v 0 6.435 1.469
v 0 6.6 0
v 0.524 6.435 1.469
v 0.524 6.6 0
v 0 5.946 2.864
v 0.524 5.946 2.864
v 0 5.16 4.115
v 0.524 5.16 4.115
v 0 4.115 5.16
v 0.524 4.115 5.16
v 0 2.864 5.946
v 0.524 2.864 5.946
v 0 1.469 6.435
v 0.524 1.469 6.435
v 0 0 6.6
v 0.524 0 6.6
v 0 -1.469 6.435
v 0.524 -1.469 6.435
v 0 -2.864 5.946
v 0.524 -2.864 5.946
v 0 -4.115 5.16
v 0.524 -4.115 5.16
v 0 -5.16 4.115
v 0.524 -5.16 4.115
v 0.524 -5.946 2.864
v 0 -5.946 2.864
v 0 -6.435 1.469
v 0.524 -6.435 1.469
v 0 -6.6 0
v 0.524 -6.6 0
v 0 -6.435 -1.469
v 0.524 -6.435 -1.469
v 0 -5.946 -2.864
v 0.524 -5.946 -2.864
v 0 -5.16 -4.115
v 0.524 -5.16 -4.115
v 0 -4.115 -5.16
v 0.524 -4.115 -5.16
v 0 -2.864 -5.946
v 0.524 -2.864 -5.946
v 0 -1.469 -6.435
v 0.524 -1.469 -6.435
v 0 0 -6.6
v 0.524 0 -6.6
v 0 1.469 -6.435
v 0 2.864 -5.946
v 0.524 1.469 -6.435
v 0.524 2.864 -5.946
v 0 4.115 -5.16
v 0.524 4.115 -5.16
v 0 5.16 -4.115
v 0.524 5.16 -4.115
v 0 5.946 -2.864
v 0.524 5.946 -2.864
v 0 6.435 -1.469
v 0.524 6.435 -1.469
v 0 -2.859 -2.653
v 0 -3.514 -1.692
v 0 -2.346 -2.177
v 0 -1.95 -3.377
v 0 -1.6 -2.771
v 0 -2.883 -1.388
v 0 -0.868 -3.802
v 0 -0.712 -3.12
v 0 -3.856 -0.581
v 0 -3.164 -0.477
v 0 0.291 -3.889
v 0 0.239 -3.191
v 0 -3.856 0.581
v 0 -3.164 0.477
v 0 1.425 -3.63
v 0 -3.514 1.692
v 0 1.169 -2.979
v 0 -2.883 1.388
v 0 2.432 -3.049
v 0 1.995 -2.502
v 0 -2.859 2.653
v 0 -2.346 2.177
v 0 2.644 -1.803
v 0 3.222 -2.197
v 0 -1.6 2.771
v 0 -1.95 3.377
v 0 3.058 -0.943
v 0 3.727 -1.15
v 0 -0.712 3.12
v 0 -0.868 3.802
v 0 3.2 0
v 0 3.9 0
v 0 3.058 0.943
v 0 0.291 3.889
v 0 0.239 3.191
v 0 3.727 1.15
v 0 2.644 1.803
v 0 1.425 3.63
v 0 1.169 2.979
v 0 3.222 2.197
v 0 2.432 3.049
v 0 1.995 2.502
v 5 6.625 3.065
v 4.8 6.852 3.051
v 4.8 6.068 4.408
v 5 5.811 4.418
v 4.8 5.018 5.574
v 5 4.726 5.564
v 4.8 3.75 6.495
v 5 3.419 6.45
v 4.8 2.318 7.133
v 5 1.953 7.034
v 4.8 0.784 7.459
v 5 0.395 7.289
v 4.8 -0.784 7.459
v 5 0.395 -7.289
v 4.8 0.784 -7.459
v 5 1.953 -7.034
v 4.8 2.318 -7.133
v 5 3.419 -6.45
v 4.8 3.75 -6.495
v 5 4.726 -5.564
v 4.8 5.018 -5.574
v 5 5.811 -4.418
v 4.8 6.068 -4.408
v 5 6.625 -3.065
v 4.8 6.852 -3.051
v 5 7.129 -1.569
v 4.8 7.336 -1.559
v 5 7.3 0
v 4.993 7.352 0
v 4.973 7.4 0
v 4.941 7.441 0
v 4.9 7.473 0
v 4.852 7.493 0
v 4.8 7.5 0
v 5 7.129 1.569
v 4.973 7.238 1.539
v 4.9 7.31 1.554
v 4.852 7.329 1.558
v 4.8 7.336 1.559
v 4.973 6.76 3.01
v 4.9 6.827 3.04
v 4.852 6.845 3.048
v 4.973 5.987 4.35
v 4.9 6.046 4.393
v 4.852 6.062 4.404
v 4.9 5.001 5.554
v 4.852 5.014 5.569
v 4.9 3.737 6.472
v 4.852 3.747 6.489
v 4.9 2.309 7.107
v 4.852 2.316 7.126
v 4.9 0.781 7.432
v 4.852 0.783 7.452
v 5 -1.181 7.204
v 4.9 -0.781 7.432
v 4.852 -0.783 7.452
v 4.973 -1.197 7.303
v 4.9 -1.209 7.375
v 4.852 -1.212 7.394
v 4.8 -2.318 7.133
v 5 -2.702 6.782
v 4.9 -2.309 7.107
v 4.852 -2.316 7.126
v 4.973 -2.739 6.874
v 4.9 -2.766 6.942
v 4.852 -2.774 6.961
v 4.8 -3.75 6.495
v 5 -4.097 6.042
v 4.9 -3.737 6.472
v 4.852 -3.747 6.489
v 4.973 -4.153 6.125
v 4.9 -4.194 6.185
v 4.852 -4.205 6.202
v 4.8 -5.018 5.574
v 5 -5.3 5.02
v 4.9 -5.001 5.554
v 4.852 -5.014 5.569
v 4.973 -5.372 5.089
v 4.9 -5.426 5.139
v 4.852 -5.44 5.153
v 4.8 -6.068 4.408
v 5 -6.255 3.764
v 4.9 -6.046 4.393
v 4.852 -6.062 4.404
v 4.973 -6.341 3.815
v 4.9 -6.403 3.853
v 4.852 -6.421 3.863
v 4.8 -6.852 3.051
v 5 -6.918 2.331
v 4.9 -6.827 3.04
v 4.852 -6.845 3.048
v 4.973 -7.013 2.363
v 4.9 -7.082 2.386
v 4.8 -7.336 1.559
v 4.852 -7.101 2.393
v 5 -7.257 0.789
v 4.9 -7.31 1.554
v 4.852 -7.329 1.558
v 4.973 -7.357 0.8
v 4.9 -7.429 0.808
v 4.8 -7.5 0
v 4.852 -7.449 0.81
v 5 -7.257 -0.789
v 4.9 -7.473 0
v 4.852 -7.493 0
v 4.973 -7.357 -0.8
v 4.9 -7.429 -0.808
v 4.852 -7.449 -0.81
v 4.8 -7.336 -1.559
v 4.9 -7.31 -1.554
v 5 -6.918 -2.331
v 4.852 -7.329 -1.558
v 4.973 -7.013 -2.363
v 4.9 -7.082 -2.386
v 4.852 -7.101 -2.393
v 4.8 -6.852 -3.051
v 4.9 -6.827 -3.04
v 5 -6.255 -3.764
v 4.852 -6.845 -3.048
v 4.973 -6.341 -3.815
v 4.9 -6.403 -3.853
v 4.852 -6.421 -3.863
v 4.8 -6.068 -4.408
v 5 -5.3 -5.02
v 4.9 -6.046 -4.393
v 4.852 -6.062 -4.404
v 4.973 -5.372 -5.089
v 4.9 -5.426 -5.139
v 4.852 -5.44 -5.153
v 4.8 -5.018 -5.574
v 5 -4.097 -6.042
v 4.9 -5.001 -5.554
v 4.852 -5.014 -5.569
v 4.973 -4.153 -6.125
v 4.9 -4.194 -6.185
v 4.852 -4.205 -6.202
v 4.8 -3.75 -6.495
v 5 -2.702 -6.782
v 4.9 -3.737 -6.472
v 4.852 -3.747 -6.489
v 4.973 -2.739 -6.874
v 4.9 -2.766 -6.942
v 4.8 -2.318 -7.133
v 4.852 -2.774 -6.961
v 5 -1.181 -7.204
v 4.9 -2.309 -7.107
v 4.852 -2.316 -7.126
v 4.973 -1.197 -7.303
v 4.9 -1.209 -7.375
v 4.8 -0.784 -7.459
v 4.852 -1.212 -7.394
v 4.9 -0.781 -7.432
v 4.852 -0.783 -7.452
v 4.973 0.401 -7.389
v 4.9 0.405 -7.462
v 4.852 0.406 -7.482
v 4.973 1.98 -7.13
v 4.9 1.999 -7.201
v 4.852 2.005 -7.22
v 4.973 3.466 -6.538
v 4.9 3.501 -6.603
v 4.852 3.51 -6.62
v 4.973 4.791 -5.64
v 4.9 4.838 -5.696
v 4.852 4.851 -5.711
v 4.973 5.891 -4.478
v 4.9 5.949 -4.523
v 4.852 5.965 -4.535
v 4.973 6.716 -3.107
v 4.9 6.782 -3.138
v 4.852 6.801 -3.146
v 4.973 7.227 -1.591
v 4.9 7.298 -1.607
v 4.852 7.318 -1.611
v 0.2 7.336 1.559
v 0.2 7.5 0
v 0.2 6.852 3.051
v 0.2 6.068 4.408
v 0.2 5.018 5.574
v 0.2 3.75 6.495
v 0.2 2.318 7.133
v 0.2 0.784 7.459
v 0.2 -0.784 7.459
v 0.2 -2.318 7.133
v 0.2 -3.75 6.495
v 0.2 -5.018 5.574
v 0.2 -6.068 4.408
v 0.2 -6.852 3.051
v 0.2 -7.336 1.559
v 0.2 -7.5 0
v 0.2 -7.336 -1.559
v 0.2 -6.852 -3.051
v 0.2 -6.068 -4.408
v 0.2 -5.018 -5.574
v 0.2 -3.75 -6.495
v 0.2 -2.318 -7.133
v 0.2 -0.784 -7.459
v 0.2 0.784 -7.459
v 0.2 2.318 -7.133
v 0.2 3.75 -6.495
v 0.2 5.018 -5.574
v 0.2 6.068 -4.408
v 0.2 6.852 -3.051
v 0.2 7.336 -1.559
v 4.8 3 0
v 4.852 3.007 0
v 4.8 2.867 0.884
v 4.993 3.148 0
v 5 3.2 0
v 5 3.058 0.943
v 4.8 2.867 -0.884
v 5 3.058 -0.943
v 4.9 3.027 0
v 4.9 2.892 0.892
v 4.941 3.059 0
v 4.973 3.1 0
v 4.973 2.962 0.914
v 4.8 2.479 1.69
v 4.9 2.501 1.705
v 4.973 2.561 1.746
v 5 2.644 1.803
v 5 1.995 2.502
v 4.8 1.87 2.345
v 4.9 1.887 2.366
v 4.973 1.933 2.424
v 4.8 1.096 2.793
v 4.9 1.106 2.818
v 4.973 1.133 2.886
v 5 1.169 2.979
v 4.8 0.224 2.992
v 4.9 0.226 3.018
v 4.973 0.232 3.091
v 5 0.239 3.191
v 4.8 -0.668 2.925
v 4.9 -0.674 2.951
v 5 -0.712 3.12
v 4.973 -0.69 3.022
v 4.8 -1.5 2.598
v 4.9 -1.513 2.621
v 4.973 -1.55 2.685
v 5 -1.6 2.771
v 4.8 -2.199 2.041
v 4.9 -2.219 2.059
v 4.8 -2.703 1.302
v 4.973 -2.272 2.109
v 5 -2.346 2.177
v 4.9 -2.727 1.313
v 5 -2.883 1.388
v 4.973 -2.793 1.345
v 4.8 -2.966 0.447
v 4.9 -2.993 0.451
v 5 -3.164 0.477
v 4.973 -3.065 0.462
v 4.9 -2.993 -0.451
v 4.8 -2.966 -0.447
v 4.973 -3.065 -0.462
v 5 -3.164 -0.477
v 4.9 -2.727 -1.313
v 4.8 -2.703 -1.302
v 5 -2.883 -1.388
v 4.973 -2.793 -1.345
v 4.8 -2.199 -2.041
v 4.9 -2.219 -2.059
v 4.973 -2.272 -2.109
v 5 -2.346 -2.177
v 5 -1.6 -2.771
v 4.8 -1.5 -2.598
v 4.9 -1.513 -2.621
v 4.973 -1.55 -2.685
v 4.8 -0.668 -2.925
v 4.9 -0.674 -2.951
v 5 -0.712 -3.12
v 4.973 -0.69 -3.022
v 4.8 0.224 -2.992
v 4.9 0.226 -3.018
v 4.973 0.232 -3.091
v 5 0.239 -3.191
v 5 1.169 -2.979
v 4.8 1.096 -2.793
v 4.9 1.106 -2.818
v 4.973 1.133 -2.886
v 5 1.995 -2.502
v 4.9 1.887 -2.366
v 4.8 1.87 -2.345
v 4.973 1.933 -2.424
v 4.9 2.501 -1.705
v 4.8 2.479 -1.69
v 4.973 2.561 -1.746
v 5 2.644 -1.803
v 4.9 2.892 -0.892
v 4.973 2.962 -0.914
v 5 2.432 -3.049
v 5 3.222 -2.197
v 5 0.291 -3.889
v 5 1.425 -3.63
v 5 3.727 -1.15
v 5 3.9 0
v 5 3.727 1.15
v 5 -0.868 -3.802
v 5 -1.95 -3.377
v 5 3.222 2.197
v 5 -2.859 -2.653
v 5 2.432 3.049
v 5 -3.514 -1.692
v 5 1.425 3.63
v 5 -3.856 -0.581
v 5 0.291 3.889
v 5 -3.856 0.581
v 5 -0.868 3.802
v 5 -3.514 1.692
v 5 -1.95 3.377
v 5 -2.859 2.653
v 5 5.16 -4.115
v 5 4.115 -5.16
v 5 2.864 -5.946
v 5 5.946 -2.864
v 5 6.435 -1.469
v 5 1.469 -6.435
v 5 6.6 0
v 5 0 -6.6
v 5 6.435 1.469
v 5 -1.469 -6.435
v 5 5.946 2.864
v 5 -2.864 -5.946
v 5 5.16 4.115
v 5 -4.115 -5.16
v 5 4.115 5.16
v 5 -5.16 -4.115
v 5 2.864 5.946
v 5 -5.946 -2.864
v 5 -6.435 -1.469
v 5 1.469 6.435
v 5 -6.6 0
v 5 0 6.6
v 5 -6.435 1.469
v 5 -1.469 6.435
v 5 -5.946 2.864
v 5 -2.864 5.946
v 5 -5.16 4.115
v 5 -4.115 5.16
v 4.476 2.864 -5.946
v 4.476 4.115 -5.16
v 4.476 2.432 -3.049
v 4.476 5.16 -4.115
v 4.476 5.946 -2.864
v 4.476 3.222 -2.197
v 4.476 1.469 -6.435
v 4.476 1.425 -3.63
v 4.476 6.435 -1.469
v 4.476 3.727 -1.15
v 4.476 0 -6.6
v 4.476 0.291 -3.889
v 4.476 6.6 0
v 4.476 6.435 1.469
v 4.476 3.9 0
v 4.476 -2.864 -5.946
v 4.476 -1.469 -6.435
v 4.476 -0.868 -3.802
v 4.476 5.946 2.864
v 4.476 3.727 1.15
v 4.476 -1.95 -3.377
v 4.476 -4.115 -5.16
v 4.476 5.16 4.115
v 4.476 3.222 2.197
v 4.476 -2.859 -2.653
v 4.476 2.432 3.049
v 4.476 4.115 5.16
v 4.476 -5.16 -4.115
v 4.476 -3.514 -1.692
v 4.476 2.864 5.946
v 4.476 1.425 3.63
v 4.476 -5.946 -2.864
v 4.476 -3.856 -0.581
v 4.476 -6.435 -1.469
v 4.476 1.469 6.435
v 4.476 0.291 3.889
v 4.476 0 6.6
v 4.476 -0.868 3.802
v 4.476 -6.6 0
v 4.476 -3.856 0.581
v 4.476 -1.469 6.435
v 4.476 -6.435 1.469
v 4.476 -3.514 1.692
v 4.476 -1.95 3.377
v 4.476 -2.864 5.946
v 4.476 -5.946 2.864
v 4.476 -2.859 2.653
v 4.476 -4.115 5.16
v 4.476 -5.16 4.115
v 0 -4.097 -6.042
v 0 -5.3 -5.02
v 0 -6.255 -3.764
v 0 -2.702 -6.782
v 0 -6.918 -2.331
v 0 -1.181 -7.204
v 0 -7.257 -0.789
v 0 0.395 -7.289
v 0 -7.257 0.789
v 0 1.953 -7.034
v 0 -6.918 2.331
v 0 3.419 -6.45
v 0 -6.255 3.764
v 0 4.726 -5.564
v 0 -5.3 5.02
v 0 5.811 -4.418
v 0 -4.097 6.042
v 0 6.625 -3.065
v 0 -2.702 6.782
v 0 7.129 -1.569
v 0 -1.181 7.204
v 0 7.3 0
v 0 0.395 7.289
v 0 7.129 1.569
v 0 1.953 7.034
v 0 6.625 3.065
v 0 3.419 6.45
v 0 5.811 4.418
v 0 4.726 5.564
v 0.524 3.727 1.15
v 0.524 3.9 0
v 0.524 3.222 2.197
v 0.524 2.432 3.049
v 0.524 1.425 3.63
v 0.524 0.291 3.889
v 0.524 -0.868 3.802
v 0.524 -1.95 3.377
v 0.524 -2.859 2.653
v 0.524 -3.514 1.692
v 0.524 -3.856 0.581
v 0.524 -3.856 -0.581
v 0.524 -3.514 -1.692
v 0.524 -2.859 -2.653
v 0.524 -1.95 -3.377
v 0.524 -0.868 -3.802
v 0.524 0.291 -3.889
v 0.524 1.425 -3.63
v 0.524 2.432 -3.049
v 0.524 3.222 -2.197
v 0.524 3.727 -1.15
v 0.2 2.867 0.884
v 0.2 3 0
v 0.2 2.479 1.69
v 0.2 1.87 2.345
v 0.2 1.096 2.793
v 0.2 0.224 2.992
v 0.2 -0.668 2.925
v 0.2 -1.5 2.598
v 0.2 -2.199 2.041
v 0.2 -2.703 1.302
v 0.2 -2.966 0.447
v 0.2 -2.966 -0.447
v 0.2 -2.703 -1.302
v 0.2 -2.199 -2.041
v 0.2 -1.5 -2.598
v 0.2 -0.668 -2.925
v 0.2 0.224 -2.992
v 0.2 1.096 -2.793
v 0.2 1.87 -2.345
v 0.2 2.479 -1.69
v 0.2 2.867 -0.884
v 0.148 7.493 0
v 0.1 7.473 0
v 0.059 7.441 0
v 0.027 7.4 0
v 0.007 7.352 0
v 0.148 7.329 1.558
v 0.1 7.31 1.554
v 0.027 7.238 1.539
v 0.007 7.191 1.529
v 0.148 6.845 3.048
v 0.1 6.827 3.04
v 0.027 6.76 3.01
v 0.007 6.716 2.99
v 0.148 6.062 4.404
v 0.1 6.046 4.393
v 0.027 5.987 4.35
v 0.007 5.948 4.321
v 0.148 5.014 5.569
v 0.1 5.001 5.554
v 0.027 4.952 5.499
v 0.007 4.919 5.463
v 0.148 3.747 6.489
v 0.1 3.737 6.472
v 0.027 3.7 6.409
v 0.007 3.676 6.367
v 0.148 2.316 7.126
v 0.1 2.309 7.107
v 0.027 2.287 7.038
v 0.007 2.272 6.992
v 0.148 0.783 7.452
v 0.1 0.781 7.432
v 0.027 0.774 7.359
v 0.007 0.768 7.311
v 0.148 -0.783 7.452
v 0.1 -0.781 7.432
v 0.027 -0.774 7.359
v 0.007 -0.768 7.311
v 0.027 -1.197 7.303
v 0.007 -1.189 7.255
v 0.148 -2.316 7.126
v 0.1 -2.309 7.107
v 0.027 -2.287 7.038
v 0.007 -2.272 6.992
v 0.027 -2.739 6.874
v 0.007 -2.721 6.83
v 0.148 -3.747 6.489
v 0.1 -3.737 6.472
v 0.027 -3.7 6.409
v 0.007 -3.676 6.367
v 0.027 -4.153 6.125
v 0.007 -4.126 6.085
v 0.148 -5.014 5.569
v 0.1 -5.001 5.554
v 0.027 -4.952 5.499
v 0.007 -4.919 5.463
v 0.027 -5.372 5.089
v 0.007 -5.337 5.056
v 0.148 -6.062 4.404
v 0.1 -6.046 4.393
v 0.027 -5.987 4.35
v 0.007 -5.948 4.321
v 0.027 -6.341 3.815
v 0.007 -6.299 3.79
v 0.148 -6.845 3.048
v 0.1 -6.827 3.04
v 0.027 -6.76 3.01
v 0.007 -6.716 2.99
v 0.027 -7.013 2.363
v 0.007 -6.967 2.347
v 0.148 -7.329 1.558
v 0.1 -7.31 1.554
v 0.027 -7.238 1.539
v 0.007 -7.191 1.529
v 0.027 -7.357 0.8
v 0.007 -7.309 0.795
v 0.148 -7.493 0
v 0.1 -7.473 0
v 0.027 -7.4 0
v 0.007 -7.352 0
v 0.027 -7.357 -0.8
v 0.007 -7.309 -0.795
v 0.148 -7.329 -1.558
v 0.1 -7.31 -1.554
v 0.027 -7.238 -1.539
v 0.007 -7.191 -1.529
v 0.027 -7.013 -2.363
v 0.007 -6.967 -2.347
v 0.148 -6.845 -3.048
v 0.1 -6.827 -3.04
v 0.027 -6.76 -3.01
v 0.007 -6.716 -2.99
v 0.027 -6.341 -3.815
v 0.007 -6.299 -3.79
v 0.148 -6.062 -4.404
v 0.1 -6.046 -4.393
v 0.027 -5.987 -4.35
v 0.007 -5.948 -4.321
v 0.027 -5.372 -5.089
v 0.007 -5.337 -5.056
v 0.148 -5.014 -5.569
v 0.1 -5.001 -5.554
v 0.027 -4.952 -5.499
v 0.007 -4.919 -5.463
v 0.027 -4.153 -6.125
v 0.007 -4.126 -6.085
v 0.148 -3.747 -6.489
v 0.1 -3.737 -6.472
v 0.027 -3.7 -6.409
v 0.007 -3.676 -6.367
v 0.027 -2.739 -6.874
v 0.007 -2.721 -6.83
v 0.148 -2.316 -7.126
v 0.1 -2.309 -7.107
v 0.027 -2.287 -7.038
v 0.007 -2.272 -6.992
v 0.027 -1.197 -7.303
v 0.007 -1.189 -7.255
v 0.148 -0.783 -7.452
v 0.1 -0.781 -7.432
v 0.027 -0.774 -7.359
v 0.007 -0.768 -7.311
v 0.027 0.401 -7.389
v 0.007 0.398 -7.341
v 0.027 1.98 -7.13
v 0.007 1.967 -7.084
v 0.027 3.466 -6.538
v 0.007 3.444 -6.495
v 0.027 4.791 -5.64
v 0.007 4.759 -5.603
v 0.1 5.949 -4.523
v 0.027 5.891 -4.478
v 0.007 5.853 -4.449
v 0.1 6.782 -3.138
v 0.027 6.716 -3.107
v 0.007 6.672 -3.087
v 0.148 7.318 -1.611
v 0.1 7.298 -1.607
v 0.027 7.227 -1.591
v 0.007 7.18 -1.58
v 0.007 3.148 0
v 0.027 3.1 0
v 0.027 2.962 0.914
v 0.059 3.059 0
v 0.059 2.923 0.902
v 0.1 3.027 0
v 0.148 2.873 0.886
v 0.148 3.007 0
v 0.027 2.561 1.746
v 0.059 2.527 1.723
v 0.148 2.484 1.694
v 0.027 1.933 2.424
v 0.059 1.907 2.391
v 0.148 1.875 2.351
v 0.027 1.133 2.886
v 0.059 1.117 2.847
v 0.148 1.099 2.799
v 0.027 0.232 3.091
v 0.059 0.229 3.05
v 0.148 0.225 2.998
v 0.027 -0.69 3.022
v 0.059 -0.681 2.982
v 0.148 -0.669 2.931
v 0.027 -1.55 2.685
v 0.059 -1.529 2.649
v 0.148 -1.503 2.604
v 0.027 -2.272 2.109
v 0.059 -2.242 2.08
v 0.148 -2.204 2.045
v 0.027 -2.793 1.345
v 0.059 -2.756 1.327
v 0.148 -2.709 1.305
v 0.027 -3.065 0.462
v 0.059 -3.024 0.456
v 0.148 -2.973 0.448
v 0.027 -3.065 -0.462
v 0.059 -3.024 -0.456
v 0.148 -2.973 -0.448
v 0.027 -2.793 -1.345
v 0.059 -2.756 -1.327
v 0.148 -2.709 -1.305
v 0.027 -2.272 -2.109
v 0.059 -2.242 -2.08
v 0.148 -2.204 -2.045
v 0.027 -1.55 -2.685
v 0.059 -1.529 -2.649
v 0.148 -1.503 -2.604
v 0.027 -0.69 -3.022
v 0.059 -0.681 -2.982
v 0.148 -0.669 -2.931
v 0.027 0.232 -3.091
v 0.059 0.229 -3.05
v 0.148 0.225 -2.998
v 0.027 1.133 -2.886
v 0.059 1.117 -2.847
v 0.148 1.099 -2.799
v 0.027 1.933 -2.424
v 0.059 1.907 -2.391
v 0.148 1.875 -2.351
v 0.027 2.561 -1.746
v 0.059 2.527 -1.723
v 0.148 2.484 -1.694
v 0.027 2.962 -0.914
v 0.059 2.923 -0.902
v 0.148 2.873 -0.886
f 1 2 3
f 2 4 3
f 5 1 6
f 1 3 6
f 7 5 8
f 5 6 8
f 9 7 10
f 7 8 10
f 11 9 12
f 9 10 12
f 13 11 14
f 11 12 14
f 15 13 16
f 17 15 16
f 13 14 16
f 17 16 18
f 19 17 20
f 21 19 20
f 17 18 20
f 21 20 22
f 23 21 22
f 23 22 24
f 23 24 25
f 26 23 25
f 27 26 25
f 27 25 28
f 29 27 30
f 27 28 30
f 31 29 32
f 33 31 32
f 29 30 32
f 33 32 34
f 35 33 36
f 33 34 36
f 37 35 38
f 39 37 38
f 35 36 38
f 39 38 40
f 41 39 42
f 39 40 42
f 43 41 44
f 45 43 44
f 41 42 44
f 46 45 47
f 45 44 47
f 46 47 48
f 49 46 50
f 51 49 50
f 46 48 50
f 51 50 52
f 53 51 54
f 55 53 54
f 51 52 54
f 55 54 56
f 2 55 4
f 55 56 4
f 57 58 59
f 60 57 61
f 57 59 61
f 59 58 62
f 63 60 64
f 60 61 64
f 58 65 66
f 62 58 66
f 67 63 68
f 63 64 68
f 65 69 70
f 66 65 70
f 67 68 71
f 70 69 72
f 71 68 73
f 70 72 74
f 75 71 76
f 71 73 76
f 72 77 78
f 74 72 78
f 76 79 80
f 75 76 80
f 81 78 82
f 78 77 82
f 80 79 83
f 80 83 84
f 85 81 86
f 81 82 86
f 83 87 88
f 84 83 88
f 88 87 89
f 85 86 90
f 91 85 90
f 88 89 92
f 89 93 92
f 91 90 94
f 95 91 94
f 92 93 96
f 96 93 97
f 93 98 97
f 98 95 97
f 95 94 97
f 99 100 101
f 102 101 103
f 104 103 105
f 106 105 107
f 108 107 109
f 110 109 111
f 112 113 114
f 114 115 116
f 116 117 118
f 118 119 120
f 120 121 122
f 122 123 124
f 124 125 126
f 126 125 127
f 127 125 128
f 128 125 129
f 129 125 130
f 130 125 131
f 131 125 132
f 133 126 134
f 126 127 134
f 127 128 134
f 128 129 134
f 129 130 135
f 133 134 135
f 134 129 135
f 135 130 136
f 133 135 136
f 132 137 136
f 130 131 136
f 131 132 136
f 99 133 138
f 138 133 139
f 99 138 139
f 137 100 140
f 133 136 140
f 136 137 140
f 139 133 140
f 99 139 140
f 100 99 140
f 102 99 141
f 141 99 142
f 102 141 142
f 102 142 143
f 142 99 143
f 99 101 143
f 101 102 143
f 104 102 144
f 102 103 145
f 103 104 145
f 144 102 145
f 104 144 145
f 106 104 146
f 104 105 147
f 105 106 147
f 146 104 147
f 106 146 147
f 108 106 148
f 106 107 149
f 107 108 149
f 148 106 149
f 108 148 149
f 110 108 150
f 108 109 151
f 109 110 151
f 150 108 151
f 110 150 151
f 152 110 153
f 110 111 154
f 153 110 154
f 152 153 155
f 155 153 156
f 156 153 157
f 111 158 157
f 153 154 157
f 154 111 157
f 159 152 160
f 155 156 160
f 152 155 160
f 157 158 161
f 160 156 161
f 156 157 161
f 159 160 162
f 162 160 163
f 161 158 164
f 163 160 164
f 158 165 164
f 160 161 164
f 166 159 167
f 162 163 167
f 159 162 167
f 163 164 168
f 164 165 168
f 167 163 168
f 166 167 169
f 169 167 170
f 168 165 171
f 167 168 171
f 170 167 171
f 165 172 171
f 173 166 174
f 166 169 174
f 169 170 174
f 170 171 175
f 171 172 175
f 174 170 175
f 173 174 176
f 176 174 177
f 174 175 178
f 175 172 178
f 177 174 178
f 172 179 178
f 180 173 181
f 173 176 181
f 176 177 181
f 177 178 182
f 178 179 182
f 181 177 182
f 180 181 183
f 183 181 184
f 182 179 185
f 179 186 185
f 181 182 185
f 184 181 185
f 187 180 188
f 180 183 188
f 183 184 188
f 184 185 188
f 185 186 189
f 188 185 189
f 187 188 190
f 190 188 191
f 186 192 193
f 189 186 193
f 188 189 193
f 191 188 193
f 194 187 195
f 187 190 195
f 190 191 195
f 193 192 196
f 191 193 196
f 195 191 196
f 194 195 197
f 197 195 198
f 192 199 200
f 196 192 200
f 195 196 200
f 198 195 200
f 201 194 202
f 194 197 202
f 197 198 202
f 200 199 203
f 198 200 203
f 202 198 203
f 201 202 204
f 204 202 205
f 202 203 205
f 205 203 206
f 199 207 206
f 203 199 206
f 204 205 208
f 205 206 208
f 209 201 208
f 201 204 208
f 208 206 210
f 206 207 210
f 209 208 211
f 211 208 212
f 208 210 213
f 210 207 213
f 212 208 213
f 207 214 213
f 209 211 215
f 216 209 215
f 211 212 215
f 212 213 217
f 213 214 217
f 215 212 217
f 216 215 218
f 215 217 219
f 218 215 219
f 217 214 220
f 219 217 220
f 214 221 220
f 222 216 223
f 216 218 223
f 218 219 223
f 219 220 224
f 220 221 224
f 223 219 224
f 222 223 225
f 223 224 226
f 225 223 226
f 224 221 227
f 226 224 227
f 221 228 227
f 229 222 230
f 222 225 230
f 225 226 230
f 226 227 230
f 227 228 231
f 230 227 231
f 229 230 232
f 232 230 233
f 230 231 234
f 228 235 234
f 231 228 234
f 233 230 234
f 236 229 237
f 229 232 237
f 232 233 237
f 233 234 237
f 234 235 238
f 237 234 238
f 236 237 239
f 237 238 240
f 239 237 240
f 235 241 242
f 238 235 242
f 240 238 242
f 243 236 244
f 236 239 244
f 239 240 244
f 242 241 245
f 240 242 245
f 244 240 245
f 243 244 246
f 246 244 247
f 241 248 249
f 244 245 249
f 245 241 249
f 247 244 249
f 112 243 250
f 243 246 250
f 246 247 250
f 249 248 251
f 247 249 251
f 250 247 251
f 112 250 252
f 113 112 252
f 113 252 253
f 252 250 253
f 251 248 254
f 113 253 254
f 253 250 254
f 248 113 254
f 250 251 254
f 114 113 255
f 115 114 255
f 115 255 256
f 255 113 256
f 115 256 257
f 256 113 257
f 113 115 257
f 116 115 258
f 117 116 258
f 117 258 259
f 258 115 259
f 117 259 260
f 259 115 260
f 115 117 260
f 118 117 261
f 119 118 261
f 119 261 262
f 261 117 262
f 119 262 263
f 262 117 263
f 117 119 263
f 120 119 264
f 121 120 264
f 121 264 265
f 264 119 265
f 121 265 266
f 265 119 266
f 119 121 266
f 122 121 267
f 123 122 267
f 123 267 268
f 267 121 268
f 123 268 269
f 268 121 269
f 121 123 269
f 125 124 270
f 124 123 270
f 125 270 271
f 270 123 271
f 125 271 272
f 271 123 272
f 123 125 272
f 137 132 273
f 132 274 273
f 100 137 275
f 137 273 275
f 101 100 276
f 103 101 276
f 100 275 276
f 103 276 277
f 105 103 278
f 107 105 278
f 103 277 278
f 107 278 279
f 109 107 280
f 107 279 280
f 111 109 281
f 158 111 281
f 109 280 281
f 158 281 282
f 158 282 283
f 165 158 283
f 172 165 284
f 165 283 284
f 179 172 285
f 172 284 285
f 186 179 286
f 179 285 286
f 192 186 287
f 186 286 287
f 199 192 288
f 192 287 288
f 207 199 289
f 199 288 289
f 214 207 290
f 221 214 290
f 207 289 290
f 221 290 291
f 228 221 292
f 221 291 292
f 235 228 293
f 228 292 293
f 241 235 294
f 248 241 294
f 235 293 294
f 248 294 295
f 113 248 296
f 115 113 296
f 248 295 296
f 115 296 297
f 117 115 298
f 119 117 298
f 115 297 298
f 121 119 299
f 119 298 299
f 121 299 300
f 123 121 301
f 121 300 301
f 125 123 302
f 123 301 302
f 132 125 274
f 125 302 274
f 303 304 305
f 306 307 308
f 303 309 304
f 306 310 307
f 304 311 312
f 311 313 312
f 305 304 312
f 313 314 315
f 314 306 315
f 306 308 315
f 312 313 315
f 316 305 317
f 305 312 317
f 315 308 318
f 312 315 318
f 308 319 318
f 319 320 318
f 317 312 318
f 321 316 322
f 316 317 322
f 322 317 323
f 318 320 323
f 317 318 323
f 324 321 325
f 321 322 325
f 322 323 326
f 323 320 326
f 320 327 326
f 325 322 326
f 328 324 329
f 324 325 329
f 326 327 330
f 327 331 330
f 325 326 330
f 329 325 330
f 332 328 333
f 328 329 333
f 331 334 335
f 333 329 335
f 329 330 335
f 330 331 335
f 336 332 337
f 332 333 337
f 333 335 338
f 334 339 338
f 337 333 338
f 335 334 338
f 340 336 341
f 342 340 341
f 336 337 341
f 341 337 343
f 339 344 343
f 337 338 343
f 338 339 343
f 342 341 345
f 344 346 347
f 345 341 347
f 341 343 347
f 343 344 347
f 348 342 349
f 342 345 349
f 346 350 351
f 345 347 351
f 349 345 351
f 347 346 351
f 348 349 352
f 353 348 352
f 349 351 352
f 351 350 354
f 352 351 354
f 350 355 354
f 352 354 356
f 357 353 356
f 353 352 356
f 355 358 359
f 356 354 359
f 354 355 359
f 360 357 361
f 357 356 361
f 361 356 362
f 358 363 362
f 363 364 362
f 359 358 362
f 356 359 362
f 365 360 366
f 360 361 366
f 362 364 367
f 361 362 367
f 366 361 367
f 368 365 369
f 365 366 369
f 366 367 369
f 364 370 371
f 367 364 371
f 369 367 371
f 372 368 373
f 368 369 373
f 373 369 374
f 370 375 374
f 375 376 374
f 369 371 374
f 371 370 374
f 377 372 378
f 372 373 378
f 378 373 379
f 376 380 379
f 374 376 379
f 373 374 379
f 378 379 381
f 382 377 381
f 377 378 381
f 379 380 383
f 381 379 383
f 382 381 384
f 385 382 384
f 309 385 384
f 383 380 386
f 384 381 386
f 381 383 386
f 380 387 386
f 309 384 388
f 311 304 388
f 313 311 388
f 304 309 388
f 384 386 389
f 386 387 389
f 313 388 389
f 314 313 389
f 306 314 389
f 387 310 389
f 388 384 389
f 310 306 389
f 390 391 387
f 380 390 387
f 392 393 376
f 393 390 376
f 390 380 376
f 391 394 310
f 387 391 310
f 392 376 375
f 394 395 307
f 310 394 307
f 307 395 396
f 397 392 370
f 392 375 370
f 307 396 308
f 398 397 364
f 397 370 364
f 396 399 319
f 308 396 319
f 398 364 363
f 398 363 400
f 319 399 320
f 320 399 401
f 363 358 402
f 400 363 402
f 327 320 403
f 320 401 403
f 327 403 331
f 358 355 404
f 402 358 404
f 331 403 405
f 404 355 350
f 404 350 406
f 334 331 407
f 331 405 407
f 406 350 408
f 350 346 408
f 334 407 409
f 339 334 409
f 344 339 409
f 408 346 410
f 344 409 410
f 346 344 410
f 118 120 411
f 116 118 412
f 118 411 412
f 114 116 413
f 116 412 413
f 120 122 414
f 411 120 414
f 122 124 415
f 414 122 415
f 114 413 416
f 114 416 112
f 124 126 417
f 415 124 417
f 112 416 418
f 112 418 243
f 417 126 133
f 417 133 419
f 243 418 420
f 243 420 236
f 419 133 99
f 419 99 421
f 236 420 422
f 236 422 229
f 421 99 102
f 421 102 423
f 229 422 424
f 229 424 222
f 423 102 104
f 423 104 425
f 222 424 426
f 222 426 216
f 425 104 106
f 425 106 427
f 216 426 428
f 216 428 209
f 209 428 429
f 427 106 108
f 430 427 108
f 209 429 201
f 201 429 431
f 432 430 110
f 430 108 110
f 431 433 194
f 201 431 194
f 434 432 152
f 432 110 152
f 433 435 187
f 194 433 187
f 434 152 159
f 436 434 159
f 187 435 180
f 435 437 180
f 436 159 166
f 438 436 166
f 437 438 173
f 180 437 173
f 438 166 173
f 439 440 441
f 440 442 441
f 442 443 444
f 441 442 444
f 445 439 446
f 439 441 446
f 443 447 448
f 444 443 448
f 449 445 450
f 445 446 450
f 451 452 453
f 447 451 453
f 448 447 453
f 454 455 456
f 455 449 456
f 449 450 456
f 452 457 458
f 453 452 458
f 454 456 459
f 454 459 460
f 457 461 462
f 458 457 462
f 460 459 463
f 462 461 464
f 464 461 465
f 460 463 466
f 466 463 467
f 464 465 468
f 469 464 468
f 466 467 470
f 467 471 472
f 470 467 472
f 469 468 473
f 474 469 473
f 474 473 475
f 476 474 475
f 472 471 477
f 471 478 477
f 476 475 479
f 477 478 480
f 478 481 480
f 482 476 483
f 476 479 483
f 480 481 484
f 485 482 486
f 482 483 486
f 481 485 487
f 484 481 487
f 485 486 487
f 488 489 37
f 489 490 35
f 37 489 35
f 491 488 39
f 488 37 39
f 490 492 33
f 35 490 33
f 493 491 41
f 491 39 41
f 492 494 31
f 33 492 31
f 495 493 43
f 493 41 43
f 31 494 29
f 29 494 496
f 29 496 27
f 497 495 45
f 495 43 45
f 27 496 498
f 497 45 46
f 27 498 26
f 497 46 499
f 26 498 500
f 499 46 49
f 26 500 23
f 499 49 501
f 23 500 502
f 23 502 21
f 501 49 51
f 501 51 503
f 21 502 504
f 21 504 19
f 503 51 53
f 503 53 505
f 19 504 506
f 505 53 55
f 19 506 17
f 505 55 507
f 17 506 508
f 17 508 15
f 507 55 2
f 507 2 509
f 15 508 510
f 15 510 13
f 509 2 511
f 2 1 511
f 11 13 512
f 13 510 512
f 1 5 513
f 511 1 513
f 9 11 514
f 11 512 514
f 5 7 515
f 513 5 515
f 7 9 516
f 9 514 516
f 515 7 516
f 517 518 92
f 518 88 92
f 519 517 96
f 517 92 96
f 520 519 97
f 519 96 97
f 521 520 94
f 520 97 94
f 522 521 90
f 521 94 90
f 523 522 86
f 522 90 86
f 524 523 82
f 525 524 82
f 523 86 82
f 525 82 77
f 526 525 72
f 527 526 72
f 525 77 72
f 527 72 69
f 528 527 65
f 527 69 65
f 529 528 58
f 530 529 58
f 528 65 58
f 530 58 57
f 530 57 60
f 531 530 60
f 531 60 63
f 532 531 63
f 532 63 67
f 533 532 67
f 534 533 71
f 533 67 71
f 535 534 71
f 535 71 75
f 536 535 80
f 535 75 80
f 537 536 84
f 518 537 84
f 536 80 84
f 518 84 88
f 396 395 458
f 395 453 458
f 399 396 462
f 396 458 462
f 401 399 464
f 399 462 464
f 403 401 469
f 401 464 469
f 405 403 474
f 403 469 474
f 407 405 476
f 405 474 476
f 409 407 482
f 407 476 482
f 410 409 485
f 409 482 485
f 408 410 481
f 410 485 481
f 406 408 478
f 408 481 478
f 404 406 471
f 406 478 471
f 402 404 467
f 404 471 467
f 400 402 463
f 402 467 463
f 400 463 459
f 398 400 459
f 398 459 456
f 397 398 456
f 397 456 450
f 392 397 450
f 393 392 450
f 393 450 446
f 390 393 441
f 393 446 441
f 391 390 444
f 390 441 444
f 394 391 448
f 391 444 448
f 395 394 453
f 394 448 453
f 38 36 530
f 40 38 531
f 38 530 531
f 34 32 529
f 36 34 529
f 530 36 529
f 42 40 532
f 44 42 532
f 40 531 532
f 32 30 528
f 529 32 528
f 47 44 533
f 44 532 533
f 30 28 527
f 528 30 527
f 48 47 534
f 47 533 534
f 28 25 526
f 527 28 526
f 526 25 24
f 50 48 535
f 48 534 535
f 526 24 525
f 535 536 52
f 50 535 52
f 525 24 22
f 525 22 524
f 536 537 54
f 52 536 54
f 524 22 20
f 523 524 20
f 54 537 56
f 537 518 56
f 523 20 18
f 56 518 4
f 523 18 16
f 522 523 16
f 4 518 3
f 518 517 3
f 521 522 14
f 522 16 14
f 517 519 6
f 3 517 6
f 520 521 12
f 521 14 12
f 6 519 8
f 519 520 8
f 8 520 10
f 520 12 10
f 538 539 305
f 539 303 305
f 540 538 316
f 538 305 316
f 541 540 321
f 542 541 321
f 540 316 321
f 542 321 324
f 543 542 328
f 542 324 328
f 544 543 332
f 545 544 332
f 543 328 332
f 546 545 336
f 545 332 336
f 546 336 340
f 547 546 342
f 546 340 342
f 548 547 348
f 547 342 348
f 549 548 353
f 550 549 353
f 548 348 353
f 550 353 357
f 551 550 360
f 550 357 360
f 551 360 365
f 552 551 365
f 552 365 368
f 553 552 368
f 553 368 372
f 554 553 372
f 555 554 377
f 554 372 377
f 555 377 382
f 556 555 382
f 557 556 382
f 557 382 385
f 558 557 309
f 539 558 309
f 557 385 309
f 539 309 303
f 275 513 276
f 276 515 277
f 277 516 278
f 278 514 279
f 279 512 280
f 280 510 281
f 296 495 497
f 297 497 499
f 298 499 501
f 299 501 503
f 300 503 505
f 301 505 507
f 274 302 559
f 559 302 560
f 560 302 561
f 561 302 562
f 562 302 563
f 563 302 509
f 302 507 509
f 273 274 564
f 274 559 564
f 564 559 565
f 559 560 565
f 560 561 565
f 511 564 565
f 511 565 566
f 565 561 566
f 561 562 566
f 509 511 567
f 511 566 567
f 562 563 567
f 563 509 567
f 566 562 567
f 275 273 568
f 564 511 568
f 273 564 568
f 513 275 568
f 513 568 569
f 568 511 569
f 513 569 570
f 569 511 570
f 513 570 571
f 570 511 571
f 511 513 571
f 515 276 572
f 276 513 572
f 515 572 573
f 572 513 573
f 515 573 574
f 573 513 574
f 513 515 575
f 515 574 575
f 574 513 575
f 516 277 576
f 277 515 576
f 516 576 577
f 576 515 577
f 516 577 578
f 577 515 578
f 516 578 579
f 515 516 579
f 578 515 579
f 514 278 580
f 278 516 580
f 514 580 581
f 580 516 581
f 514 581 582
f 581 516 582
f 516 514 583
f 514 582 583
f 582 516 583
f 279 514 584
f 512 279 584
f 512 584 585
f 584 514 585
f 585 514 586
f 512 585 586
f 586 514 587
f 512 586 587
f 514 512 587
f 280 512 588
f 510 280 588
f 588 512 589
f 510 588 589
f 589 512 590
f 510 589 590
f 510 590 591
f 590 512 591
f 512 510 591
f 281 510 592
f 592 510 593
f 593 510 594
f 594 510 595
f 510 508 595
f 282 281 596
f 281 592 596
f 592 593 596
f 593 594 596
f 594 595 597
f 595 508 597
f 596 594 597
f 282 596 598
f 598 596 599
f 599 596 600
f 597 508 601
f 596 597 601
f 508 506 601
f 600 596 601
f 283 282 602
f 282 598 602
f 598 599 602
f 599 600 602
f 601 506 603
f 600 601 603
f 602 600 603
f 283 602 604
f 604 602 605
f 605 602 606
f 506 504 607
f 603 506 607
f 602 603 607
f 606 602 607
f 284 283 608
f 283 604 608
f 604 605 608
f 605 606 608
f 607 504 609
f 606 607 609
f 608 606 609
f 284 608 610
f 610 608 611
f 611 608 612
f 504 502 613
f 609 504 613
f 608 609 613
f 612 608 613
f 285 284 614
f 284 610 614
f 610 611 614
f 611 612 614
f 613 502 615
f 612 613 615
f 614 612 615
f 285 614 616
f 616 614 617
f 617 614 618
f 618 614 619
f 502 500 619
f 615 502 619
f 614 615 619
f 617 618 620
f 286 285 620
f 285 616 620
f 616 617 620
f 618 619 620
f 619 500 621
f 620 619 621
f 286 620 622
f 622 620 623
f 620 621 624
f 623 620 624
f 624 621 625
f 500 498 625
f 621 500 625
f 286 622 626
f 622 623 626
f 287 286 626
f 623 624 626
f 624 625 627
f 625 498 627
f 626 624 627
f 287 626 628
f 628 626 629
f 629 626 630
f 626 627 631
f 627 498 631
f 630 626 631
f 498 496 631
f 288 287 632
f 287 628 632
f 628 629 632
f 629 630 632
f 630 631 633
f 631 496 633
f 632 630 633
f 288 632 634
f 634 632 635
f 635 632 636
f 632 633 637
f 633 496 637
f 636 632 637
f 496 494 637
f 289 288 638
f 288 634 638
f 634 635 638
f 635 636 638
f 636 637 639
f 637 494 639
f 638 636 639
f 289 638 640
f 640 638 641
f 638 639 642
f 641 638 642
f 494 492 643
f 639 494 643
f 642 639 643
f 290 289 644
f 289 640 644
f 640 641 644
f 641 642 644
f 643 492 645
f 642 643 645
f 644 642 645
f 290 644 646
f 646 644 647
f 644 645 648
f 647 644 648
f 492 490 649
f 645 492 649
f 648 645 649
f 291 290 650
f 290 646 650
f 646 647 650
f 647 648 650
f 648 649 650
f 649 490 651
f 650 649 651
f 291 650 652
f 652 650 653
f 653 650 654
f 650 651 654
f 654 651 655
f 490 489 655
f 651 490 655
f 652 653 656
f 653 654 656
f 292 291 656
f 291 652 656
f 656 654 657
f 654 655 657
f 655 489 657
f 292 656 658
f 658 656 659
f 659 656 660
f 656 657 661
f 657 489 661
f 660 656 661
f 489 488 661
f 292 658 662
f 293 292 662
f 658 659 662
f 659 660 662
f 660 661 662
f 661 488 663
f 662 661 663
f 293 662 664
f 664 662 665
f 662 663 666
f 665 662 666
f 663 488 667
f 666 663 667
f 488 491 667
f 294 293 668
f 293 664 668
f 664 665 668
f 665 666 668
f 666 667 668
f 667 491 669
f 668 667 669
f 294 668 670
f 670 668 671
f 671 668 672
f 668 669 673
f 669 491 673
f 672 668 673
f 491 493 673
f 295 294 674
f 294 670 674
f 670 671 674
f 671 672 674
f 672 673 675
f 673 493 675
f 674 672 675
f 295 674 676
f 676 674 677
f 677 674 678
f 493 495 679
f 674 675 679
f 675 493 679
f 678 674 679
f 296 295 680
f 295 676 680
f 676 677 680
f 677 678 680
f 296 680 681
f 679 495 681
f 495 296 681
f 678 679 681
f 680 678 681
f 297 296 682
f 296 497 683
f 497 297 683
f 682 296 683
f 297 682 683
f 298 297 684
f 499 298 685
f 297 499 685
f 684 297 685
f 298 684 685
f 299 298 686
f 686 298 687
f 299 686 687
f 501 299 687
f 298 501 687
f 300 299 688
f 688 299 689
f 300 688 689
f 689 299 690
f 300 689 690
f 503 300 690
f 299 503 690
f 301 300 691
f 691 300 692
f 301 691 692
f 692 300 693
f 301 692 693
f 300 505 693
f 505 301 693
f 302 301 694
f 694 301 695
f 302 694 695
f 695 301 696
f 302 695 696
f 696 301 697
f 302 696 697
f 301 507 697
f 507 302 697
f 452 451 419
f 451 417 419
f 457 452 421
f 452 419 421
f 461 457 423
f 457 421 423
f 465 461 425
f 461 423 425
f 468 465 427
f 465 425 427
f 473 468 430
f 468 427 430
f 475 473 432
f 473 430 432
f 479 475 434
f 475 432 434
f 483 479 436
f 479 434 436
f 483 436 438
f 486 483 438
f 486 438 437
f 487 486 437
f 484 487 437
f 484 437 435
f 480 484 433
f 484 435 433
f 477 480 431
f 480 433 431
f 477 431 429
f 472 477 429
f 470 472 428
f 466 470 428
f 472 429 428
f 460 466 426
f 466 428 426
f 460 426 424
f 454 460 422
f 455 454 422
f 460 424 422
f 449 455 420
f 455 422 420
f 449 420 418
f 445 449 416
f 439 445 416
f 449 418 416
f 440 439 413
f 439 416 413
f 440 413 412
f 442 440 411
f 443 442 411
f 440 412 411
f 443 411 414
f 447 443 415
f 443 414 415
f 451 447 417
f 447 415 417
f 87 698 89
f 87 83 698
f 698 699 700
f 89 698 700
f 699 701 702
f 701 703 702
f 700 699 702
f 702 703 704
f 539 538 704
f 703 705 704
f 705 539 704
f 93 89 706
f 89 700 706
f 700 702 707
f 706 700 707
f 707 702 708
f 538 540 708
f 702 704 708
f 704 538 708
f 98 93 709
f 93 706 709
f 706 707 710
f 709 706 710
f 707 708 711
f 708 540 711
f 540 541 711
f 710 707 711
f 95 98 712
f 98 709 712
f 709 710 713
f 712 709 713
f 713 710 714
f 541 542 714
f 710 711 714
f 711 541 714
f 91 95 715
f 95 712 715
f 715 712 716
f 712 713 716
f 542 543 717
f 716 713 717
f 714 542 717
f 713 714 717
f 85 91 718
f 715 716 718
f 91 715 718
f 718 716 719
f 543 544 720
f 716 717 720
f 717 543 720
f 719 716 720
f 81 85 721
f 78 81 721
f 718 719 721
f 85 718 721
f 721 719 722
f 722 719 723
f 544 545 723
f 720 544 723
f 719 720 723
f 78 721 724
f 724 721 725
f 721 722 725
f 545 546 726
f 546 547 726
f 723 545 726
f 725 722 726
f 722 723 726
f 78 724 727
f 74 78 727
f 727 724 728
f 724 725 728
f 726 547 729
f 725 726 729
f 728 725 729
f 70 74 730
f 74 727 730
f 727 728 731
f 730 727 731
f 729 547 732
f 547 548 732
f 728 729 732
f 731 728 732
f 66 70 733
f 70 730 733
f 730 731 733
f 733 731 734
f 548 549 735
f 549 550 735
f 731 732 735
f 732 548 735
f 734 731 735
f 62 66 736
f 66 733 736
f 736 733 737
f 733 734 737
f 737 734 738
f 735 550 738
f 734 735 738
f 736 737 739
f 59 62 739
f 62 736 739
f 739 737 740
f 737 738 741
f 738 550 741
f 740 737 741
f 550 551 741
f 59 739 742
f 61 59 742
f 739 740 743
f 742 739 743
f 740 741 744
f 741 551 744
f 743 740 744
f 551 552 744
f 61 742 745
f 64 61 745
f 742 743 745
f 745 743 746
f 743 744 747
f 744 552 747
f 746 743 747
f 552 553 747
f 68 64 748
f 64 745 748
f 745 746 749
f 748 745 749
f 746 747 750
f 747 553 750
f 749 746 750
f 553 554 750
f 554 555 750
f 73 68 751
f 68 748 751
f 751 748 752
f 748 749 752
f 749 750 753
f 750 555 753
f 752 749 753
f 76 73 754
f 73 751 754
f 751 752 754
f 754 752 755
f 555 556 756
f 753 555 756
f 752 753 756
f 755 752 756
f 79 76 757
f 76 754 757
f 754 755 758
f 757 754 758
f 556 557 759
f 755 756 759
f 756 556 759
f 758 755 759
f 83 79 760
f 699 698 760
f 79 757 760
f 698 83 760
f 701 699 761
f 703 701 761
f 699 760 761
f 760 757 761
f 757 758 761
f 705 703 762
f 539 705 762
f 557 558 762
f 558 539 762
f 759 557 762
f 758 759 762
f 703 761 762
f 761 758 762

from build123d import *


with BuildPart() as part:
    # Sketch1 → Revolve1 (revolve)
    with BuildSketch(Plane.XY):
        with BuildLine():
            Line((0, 3.9), (0, 3.2))
            ThreePointArc((0, 3.2), (0.058578644, 3.058578644), (0.2, 3))
            Line((0.2, 3), (4.8, 3))
            ThreePointArc((4.8, 3), (4.941421356, 3.058578644), (5, 3.2))
            Line((5, 3.2), (5, 3.9))
            Line((5, 3.9), (4.4765, 3.9))
            Line((4.4765, 3.9), (4.4765, 6.6))
            Line((4.4765, 6.6), (5, 6.6))
            Line((5, 6.6), (5, 7.3))
            ThreePointArc((5, 7.3), (4.941421356, 7.441421356), (4.8, 7.5))
            Line((4.8, 7.5), (0.2, 7.5))
            ThreePointArc((0.2, 7.5), (0.058578644, 7.441421356), (0, 7.3))
            Line((0, 7.3), (0, 6.6))
            Line((0, 6.6), (0.5235, 6.6))
            Line((0.5235, 6.6), (0.5235, 3.9))
            Line((0.5235, 3.9), (0, 3.9))
        make_face()
    revolve(axis=Axis((-0.001349798, 0, 0), (1, 0, 0)))


solid = part.part
